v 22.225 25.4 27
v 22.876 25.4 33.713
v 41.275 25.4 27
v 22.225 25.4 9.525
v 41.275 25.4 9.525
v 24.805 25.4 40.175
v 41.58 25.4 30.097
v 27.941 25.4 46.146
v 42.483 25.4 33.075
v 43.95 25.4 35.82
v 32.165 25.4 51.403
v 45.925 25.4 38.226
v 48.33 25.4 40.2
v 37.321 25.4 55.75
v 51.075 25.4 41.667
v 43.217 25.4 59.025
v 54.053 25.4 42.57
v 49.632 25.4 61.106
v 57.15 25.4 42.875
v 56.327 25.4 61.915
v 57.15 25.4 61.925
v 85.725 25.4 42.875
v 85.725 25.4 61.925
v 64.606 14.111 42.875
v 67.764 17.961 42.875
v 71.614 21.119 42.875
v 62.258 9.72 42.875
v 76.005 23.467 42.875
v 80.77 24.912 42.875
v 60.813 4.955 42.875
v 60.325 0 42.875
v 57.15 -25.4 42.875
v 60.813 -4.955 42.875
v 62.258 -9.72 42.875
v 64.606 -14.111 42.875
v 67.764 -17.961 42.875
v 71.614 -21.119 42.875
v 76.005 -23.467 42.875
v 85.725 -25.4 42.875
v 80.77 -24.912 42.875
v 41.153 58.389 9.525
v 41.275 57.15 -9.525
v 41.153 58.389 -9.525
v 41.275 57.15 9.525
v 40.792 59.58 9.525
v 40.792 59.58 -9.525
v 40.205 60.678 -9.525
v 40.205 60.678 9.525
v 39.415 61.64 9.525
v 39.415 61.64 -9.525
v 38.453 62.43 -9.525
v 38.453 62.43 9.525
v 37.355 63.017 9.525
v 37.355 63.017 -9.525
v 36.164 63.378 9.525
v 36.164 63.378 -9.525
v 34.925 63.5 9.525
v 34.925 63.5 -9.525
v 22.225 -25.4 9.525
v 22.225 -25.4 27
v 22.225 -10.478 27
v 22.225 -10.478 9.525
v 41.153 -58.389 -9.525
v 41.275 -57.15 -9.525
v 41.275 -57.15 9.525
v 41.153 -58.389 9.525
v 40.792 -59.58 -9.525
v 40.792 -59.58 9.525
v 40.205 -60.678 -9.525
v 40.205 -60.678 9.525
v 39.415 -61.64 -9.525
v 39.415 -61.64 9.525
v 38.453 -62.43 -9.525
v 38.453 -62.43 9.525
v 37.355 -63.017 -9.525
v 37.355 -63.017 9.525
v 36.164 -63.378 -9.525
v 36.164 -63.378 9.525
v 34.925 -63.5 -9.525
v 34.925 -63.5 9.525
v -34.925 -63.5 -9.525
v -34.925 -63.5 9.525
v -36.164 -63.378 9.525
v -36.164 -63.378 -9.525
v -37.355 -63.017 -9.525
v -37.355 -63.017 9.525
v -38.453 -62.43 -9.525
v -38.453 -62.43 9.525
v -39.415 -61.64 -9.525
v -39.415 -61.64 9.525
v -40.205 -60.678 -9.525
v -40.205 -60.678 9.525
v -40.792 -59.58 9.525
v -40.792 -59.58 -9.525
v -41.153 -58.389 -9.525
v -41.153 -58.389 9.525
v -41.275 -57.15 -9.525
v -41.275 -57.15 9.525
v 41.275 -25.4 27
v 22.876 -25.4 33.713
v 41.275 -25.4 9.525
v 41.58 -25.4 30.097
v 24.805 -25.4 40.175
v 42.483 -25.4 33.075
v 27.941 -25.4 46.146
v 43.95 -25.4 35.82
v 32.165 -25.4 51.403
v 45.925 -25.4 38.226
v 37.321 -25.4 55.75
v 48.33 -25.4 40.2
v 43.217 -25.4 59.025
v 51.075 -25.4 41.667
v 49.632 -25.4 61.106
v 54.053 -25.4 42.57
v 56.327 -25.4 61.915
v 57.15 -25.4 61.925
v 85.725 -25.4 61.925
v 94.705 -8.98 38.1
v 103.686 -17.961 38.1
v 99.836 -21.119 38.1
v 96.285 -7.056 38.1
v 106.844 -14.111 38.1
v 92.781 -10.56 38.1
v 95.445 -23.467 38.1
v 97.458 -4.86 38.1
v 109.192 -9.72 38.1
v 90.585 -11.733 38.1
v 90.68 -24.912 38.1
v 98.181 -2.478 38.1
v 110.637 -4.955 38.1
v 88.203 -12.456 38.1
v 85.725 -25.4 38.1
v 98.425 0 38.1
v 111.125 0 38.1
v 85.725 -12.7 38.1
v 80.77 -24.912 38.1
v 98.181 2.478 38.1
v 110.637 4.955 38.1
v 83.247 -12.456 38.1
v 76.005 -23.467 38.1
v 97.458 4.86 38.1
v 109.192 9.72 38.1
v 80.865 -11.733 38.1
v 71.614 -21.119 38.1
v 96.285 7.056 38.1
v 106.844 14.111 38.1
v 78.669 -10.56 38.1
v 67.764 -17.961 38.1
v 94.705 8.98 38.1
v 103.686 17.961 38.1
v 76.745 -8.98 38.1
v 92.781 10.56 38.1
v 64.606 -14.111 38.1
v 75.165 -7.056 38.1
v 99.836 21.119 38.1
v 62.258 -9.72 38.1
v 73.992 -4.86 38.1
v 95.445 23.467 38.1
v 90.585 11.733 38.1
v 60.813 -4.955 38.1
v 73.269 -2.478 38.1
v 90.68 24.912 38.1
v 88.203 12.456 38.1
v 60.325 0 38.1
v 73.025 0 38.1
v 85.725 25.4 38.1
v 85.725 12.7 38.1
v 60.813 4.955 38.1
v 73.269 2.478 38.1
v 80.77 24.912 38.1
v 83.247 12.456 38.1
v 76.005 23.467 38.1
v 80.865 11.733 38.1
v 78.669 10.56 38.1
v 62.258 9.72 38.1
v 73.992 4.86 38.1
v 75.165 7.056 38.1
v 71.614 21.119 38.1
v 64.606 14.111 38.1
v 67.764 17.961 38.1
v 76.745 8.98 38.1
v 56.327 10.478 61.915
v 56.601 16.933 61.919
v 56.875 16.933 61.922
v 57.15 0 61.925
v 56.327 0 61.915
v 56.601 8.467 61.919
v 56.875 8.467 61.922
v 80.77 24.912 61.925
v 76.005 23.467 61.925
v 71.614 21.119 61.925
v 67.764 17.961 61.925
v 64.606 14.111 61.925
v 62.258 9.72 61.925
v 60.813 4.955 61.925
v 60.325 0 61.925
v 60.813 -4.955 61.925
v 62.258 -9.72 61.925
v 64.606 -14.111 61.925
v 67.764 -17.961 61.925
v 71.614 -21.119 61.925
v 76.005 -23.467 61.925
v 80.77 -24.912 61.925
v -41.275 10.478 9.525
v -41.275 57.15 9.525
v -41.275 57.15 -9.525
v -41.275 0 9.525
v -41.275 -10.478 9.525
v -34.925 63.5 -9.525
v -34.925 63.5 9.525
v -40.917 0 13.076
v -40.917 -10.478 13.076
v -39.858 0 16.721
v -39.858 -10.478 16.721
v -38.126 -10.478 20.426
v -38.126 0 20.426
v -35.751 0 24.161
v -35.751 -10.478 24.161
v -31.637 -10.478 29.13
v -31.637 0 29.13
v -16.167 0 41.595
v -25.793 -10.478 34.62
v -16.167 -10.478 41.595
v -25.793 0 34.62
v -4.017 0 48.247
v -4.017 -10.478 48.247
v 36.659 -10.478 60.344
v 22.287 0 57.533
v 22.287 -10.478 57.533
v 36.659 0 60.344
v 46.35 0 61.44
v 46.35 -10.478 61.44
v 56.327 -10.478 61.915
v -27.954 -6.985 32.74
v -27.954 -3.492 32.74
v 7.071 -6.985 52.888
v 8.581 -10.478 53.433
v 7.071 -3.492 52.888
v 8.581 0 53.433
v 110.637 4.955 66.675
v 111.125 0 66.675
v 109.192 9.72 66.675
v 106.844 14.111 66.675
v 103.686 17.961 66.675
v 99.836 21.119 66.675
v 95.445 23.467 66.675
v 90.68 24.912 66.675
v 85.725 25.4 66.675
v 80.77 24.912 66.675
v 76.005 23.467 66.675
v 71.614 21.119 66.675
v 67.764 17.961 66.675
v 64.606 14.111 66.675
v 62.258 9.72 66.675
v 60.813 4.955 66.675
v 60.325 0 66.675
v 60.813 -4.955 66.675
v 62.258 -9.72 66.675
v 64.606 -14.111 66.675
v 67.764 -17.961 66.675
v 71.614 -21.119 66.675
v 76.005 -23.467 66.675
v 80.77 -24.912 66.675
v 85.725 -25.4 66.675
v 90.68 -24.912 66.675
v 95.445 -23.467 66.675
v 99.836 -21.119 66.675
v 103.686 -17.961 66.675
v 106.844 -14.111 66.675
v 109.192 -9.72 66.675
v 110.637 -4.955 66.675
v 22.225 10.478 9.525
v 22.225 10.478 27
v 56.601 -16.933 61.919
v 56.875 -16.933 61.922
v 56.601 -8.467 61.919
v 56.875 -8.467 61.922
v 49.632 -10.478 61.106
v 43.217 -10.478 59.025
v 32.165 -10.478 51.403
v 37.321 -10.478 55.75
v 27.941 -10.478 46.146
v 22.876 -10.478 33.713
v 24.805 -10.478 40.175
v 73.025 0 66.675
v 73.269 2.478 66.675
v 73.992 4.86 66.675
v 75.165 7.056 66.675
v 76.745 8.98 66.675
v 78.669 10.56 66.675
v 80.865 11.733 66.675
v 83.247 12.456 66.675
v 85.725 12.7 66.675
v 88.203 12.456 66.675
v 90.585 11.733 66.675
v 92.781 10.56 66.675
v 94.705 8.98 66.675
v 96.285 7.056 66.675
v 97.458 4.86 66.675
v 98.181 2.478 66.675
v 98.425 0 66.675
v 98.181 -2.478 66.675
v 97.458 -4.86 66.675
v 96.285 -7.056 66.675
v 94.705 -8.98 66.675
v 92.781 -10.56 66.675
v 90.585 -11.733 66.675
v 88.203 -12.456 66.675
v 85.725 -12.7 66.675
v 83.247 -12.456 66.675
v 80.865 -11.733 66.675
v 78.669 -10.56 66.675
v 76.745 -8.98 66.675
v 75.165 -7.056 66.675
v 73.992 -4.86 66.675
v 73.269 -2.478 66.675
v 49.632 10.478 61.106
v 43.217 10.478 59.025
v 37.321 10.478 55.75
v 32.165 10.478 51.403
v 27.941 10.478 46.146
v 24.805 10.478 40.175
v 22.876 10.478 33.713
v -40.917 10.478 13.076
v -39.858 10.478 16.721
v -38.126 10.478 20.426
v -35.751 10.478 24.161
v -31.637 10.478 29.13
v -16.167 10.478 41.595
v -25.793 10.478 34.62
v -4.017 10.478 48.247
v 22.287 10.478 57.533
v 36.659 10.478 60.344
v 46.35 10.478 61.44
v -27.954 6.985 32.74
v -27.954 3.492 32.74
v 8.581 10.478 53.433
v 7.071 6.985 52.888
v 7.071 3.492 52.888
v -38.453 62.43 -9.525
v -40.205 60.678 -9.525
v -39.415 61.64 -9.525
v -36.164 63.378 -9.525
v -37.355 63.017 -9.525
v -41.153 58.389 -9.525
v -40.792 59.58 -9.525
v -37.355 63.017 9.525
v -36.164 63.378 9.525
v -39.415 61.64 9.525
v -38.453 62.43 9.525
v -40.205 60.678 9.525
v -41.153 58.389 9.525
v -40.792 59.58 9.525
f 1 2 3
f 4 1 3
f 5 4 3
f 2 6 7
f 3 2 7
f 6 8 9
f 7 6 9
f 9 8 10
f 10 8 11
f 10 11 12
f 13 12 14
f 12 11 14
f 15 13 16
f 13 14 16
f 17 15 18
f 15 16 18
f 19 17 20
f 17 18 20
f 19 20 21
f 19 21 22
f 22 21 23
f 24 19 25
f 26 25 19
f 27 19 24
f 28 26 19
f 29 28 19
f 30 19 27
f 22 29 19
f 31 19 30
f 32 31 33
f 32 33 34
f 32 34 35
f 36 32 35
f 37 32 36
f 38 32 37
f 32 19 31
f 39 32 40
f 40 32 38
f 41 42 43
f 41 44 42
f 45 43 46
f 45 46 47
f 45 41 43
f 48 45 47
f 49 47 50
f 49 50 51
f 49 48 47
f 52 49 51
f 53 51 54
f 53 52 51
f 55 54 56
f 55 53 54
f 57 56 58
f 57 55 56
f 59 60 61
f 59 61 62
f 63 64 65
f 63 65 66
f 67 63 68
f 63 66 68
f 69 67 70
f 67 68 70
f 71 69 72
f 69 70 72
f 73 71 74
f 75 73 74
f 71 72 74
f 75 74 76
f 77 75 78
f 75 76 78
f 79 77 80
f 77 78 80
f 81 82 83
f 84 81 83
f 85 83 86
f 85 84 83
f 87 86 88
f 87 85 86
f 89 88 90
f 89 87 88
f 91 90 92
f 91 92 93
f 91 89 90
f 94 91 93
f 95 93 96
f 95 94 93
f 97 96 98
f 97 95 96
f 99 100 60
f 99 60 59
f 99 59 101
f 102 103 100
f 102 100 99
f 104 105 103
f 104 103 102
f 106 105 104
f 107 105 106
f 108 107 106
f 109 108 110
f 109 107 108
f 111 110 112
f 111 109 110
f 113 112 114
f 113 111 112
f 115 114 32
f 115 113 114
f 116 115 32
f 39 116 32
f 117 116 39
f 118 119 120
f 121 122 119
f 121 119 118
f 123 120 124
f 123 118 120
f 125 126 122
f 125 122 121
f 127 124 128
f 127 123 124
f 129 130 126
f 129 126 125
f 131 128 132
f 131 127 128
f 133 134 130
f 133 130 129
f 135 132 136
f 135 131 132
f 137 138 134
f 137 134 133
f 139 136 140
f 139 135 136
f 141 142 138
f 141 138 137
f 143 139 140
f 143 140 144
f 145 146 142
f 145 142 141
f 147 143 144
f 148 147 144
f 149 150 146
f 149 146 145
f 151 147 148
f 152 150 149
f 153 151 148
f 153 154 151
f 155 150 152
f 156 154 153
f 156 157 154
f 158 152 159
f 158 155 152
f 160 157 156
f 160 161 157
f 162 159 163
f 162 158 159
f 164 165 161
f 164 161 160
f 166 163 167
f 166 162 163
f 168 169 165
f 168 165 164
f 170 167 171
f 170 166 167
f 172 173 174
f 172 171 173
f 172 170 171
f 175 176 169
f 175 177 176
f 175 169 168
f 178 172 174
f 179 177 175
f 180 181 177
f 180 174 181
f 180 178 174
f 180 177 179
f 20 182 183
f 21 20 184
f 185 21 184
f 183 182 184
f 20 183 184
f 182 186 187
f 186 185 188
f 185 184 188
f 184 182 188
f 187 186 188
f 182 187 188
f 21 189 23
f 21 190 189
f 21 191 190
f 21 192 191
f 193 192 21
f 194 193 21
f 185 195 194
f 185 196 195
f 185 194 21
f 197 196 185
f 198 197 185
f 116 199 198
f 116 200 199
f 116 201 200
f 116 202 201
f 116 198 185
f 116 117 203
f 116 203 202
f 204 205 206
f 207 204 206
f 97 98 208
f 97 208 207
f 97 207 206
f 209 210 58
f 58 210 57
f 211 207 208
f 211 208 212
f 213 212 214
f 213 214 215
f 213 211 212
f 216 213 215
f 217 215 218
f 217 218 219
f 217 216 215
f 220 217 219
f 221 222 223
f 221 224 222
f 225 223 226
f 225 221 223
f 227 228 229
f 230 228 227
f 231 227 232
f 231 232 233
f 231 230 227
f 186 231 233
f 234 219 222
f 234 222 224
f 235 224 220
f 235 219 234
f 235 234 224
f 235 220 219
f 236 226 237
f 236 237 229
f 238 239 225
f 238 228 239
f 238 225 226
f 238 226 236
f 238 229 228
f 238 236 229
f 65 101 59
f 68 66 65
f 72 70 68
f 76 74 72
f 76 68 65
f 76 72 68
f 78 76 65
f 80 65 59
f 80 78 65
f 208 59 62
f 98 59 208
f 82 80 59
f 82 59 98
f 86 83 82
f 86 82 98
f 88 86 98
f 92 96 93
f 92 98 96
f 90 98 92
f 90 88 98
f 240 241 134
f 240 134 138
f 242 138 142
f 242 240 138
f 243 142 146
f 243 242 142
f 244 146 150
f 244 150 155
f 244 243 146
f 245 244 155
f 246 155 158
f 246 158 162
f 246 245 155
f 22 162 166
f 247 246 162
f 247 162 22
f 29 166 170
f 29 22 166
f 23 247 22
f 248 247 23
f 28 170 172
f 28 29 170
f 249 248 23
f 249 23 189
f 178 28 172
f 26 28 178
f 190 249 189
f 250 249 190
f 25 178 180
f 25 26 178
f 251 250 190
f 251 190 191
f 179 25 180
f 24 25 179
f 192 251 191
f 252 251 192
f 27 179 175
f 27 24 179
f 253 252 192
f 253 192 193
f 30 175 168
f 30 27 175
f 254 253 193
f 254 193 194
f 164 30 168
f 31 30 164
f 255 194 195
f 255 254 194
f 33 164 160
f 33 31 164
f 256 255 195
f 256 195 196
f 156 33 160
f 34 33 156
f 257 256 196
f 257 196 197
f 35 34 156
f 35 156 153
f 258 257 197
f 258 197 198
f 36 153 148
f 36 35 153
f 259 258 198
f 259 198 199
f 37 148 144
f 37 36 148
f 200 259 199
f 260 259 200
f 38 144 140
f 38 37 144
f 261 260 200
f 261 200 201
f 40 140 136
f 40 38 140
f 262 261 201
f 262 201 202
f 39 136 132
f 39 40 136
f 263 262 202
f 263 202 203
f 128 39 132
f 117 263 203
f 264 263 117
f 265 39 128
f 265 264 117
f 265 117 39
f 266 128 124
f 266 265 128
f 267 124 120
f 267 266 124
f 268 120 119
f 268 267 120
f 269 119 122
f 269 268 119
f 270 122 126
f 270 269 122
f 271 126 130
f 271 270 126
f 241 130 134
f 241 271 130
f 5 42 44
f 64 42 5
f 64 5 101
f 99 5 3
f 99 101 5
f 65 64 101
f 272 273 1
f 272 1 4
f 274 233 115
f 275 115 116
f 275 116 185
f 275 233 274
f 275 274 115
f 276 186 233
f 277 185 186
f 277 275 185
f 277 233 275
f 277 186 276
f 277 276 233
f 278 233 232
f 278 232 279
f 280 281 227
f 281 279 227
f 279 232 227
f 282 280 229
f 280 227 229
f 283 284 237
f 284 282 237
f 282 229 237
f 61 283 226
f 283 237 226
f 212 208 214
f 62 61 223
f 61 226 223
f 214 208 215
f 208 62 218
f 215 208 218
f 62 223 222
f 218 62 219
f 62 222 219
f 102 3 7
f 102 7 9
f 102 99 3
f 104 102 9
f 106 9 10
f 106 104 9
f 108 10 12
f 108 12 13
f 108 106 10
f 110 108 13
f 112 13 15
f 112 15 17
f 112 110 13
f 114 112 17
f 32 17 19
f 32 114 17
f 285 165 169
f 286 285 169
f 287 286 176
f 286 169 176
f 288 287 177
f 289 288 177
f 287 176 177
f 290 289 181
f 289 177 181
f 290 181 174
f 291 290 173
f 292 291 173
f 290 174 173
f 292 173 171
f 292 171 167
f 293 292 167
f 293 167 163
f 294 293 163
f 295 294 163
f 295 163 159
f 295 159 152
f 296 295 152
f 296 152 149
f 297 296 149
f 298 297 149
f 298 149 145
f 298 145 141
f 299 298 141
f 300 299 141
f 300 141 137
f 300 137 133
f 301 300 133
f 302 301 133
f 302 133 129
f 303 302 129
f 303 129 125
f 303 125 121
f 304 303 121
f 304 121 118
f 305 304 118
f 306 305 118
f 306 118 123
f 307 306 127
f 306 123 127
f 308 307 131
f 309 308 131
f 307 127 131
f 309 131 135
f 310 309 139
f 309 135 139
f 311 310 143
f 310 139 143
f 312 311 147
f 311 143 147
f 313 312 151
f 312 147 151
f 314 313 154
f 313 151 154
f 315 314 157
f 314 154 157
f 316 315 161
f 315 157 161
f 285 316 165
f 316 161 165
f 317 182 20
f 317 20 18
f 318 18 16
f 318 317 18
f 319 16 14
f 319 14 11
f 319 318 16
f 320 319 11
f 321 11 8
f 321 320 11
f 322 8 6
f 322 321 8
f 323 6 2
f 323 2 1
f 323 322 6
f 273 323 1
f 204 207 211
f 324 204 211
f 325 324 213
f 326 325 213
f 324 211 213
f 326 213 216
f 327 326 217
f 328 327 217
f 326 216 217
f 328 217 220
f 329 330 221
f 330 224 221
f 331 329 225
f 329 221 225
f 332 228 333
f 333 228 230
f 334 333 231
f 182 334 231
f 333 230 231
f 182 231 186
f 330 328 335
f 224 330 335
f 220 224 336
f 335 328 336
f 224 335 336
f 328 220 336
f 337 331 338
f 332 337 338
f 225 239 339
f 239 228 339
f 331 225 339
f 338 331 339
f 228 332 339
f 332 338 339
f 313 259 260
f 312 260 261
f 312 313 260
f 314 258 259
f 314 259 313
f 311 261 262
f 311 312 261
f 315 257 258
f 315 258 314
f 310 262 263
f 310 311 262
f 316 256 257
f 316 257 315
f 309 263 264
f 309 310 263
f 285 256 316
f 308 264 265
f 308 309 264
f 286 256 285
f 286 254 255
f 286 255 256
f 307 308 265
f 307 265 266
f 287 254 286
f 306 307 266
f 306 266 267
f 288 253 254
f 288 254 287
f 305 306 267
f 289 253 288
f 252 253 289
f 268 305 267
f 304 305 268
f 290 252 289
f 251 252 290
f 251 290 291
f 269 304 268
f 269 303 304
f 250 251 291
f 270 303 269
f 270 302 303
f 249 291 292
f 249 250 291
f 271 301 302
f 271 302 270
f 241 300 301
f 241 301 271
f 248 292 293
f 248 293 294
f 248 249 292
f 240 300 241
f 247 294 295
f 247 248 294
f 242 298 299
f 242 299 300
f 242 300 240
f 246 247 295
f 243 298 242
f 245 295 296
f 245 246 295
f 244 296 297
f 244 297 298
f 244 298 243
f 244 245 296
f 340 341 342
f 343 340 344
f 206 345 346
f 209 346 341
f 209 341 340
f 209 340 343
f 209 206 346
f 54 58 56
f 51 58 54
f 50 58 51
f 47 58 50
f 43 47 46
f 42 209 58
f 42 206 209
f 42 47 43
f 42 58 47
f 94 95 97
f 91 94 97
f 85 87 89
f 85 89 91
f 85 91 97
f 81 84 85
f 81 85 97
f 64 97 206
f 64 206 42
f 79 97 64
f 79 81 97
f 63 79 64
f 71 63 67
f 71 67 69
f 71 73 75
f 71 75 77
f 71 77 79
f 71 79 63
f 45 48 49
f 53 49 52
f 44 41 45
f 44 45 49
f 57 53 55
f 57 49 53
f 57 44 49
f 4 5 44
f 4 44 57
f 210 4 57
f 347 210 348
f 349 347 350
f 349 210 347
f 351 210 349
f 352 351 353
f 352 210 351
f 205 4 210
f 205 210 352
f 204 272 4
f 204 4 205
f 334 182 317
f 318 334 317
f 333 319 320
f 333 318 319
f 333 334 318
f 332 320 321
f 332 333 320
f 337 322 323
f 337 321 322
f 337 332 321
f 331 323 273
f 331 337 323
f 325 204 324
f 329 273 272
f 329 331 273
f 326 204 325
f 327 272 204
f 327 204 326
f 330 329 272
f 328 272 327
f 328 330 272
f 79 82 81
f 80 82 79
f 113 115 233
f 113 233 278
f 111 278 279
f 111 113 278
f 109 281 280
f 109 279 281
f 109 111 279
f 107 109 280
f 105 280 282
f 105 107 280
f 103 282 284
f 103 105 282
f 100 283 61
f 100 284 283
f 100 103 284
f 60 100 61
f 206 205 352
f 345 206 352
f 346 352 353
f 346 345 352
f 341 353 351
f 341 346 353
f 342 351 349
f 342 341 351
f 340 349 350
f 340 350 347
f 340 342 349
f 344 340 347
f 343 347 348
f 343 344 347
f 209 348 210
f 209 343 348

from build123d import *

# Parameters (mm, degrees)
F1_DEPTH = 63.5
F0_W     = 25.4
F0_H     = 19.05
F2_DEPTH = 25.4
F3_DEPTH = 10.4775
F5_R     = 6.35
F7_D     = 25.4


with BuildPart() as f1:
    # F0 (on Front) → F1 (new body, symmetric)
    with BuildSketch(Plane.XZ):
        Polygon((-41.275, 9.525), (-41.275, -9.525), (41.275, -9.525), (41.275, 9.525), (22.225, 9.525), align=None)
    extrude(amount=F1_DEPTH, both=True)

    # F0 (on Front) → F2 (join, symmetric)
    with BuildSketch(Plane.XZ):
        with Locations((73.025, 52.4002)):
            Rectangle(F0_W, F0_H)
        with BuildLine():
            Line((22.225, 9.525), (41.275, 9.525))
            Line((41.275, 9.525), (41.275, 27.0002))
            ThreePointArc((41.275, 27.0002), (45.9246798487, 38.2255201513), (57.15, 42.8752))
            Line((57.15, 42.8752), (60.325, 42.8752))
            Line((60.325, 42.8752), (60.325, 61.9252))
            Line((60.325, 61.9252), (57.15, 61.9252))
            add(Edge.make_bspline(
                [(56.3268874615, 61.9154990929), (56.6009974392, 61.9194787375), (56.8753697614, 61.9227139639), (57.15, 61.9252)],
                knots=[110.9401343826, 110.9401343826, 110.9401343826, 110.9401343826, 111.5045361635, 111.5045361635, 111.5045361635, 111.5045361635], degree=3))
            ThreePointArc((56.3268874615, 61.9154990929), (32.1649761817, 51.4031549399), (22.225, 27.0002))
            Line((22.225, 27.0002), (22.225, 9.525))
        make_face()
    extrude(amount=F2_DEPTH, both=True)

    # F0 (on Front) → F3 (join, symmetric)
    with BuildSketch(Plane.XZ):
        with BuildLine():
            add(Edge.make_bspline(
                [(-41.275, 9.525), (-41.296369644, 31.5891025492), (2.4471890111, 61.1332508534), (56.3268874615, 61.9154990929)],
                knots=[0, 0, 0, 0, 110.9401343826, 110.9401343826, 110.9401343826, 110.9401343826], degree=3))
            Line((-41.275, 9.525), (22.225, 9.525))
            Line((22.225, 9.525), (22.225, 27.0002))
            ThreePointArc((22.225, 27.0002), (32.1649761817, 51.4031549399), (56.3268874615, 61.9154990929))
        make_face()
    extrude(amount=F3_DEPTH, both=True)

    # F0 (on Front) → F4 (revolve)
    with BuildSketch(Plane.XZ):
        Polygon((85.725, 66.675), (85.725, 61.9252), (85.725, 42.8752), (85.725, 38.1), (111.125, 38.1), (111.125, 66.675), align=None)
    revolve(axis=Axis((85.725, 0, 52.3875), (0, 0, 1)))

    # F5
    f5_edges = [f1.edges().sort_by_distance(p)[0] for p in [
        (-41.275, -63.5, 0),
        (41.275, -63.5, 0),
        (41.275, 63.5, 0),
        (-41.275, 63.5, 0),
    ]]
    fillet(f5_edges, radius=F5_R)

    # F7 (through all)
    with Locations(Plane.XY.offset(66.675)):
        with Locations((85.725, 0)):
            Hole(F7_D / 2)


solid = f1.part
